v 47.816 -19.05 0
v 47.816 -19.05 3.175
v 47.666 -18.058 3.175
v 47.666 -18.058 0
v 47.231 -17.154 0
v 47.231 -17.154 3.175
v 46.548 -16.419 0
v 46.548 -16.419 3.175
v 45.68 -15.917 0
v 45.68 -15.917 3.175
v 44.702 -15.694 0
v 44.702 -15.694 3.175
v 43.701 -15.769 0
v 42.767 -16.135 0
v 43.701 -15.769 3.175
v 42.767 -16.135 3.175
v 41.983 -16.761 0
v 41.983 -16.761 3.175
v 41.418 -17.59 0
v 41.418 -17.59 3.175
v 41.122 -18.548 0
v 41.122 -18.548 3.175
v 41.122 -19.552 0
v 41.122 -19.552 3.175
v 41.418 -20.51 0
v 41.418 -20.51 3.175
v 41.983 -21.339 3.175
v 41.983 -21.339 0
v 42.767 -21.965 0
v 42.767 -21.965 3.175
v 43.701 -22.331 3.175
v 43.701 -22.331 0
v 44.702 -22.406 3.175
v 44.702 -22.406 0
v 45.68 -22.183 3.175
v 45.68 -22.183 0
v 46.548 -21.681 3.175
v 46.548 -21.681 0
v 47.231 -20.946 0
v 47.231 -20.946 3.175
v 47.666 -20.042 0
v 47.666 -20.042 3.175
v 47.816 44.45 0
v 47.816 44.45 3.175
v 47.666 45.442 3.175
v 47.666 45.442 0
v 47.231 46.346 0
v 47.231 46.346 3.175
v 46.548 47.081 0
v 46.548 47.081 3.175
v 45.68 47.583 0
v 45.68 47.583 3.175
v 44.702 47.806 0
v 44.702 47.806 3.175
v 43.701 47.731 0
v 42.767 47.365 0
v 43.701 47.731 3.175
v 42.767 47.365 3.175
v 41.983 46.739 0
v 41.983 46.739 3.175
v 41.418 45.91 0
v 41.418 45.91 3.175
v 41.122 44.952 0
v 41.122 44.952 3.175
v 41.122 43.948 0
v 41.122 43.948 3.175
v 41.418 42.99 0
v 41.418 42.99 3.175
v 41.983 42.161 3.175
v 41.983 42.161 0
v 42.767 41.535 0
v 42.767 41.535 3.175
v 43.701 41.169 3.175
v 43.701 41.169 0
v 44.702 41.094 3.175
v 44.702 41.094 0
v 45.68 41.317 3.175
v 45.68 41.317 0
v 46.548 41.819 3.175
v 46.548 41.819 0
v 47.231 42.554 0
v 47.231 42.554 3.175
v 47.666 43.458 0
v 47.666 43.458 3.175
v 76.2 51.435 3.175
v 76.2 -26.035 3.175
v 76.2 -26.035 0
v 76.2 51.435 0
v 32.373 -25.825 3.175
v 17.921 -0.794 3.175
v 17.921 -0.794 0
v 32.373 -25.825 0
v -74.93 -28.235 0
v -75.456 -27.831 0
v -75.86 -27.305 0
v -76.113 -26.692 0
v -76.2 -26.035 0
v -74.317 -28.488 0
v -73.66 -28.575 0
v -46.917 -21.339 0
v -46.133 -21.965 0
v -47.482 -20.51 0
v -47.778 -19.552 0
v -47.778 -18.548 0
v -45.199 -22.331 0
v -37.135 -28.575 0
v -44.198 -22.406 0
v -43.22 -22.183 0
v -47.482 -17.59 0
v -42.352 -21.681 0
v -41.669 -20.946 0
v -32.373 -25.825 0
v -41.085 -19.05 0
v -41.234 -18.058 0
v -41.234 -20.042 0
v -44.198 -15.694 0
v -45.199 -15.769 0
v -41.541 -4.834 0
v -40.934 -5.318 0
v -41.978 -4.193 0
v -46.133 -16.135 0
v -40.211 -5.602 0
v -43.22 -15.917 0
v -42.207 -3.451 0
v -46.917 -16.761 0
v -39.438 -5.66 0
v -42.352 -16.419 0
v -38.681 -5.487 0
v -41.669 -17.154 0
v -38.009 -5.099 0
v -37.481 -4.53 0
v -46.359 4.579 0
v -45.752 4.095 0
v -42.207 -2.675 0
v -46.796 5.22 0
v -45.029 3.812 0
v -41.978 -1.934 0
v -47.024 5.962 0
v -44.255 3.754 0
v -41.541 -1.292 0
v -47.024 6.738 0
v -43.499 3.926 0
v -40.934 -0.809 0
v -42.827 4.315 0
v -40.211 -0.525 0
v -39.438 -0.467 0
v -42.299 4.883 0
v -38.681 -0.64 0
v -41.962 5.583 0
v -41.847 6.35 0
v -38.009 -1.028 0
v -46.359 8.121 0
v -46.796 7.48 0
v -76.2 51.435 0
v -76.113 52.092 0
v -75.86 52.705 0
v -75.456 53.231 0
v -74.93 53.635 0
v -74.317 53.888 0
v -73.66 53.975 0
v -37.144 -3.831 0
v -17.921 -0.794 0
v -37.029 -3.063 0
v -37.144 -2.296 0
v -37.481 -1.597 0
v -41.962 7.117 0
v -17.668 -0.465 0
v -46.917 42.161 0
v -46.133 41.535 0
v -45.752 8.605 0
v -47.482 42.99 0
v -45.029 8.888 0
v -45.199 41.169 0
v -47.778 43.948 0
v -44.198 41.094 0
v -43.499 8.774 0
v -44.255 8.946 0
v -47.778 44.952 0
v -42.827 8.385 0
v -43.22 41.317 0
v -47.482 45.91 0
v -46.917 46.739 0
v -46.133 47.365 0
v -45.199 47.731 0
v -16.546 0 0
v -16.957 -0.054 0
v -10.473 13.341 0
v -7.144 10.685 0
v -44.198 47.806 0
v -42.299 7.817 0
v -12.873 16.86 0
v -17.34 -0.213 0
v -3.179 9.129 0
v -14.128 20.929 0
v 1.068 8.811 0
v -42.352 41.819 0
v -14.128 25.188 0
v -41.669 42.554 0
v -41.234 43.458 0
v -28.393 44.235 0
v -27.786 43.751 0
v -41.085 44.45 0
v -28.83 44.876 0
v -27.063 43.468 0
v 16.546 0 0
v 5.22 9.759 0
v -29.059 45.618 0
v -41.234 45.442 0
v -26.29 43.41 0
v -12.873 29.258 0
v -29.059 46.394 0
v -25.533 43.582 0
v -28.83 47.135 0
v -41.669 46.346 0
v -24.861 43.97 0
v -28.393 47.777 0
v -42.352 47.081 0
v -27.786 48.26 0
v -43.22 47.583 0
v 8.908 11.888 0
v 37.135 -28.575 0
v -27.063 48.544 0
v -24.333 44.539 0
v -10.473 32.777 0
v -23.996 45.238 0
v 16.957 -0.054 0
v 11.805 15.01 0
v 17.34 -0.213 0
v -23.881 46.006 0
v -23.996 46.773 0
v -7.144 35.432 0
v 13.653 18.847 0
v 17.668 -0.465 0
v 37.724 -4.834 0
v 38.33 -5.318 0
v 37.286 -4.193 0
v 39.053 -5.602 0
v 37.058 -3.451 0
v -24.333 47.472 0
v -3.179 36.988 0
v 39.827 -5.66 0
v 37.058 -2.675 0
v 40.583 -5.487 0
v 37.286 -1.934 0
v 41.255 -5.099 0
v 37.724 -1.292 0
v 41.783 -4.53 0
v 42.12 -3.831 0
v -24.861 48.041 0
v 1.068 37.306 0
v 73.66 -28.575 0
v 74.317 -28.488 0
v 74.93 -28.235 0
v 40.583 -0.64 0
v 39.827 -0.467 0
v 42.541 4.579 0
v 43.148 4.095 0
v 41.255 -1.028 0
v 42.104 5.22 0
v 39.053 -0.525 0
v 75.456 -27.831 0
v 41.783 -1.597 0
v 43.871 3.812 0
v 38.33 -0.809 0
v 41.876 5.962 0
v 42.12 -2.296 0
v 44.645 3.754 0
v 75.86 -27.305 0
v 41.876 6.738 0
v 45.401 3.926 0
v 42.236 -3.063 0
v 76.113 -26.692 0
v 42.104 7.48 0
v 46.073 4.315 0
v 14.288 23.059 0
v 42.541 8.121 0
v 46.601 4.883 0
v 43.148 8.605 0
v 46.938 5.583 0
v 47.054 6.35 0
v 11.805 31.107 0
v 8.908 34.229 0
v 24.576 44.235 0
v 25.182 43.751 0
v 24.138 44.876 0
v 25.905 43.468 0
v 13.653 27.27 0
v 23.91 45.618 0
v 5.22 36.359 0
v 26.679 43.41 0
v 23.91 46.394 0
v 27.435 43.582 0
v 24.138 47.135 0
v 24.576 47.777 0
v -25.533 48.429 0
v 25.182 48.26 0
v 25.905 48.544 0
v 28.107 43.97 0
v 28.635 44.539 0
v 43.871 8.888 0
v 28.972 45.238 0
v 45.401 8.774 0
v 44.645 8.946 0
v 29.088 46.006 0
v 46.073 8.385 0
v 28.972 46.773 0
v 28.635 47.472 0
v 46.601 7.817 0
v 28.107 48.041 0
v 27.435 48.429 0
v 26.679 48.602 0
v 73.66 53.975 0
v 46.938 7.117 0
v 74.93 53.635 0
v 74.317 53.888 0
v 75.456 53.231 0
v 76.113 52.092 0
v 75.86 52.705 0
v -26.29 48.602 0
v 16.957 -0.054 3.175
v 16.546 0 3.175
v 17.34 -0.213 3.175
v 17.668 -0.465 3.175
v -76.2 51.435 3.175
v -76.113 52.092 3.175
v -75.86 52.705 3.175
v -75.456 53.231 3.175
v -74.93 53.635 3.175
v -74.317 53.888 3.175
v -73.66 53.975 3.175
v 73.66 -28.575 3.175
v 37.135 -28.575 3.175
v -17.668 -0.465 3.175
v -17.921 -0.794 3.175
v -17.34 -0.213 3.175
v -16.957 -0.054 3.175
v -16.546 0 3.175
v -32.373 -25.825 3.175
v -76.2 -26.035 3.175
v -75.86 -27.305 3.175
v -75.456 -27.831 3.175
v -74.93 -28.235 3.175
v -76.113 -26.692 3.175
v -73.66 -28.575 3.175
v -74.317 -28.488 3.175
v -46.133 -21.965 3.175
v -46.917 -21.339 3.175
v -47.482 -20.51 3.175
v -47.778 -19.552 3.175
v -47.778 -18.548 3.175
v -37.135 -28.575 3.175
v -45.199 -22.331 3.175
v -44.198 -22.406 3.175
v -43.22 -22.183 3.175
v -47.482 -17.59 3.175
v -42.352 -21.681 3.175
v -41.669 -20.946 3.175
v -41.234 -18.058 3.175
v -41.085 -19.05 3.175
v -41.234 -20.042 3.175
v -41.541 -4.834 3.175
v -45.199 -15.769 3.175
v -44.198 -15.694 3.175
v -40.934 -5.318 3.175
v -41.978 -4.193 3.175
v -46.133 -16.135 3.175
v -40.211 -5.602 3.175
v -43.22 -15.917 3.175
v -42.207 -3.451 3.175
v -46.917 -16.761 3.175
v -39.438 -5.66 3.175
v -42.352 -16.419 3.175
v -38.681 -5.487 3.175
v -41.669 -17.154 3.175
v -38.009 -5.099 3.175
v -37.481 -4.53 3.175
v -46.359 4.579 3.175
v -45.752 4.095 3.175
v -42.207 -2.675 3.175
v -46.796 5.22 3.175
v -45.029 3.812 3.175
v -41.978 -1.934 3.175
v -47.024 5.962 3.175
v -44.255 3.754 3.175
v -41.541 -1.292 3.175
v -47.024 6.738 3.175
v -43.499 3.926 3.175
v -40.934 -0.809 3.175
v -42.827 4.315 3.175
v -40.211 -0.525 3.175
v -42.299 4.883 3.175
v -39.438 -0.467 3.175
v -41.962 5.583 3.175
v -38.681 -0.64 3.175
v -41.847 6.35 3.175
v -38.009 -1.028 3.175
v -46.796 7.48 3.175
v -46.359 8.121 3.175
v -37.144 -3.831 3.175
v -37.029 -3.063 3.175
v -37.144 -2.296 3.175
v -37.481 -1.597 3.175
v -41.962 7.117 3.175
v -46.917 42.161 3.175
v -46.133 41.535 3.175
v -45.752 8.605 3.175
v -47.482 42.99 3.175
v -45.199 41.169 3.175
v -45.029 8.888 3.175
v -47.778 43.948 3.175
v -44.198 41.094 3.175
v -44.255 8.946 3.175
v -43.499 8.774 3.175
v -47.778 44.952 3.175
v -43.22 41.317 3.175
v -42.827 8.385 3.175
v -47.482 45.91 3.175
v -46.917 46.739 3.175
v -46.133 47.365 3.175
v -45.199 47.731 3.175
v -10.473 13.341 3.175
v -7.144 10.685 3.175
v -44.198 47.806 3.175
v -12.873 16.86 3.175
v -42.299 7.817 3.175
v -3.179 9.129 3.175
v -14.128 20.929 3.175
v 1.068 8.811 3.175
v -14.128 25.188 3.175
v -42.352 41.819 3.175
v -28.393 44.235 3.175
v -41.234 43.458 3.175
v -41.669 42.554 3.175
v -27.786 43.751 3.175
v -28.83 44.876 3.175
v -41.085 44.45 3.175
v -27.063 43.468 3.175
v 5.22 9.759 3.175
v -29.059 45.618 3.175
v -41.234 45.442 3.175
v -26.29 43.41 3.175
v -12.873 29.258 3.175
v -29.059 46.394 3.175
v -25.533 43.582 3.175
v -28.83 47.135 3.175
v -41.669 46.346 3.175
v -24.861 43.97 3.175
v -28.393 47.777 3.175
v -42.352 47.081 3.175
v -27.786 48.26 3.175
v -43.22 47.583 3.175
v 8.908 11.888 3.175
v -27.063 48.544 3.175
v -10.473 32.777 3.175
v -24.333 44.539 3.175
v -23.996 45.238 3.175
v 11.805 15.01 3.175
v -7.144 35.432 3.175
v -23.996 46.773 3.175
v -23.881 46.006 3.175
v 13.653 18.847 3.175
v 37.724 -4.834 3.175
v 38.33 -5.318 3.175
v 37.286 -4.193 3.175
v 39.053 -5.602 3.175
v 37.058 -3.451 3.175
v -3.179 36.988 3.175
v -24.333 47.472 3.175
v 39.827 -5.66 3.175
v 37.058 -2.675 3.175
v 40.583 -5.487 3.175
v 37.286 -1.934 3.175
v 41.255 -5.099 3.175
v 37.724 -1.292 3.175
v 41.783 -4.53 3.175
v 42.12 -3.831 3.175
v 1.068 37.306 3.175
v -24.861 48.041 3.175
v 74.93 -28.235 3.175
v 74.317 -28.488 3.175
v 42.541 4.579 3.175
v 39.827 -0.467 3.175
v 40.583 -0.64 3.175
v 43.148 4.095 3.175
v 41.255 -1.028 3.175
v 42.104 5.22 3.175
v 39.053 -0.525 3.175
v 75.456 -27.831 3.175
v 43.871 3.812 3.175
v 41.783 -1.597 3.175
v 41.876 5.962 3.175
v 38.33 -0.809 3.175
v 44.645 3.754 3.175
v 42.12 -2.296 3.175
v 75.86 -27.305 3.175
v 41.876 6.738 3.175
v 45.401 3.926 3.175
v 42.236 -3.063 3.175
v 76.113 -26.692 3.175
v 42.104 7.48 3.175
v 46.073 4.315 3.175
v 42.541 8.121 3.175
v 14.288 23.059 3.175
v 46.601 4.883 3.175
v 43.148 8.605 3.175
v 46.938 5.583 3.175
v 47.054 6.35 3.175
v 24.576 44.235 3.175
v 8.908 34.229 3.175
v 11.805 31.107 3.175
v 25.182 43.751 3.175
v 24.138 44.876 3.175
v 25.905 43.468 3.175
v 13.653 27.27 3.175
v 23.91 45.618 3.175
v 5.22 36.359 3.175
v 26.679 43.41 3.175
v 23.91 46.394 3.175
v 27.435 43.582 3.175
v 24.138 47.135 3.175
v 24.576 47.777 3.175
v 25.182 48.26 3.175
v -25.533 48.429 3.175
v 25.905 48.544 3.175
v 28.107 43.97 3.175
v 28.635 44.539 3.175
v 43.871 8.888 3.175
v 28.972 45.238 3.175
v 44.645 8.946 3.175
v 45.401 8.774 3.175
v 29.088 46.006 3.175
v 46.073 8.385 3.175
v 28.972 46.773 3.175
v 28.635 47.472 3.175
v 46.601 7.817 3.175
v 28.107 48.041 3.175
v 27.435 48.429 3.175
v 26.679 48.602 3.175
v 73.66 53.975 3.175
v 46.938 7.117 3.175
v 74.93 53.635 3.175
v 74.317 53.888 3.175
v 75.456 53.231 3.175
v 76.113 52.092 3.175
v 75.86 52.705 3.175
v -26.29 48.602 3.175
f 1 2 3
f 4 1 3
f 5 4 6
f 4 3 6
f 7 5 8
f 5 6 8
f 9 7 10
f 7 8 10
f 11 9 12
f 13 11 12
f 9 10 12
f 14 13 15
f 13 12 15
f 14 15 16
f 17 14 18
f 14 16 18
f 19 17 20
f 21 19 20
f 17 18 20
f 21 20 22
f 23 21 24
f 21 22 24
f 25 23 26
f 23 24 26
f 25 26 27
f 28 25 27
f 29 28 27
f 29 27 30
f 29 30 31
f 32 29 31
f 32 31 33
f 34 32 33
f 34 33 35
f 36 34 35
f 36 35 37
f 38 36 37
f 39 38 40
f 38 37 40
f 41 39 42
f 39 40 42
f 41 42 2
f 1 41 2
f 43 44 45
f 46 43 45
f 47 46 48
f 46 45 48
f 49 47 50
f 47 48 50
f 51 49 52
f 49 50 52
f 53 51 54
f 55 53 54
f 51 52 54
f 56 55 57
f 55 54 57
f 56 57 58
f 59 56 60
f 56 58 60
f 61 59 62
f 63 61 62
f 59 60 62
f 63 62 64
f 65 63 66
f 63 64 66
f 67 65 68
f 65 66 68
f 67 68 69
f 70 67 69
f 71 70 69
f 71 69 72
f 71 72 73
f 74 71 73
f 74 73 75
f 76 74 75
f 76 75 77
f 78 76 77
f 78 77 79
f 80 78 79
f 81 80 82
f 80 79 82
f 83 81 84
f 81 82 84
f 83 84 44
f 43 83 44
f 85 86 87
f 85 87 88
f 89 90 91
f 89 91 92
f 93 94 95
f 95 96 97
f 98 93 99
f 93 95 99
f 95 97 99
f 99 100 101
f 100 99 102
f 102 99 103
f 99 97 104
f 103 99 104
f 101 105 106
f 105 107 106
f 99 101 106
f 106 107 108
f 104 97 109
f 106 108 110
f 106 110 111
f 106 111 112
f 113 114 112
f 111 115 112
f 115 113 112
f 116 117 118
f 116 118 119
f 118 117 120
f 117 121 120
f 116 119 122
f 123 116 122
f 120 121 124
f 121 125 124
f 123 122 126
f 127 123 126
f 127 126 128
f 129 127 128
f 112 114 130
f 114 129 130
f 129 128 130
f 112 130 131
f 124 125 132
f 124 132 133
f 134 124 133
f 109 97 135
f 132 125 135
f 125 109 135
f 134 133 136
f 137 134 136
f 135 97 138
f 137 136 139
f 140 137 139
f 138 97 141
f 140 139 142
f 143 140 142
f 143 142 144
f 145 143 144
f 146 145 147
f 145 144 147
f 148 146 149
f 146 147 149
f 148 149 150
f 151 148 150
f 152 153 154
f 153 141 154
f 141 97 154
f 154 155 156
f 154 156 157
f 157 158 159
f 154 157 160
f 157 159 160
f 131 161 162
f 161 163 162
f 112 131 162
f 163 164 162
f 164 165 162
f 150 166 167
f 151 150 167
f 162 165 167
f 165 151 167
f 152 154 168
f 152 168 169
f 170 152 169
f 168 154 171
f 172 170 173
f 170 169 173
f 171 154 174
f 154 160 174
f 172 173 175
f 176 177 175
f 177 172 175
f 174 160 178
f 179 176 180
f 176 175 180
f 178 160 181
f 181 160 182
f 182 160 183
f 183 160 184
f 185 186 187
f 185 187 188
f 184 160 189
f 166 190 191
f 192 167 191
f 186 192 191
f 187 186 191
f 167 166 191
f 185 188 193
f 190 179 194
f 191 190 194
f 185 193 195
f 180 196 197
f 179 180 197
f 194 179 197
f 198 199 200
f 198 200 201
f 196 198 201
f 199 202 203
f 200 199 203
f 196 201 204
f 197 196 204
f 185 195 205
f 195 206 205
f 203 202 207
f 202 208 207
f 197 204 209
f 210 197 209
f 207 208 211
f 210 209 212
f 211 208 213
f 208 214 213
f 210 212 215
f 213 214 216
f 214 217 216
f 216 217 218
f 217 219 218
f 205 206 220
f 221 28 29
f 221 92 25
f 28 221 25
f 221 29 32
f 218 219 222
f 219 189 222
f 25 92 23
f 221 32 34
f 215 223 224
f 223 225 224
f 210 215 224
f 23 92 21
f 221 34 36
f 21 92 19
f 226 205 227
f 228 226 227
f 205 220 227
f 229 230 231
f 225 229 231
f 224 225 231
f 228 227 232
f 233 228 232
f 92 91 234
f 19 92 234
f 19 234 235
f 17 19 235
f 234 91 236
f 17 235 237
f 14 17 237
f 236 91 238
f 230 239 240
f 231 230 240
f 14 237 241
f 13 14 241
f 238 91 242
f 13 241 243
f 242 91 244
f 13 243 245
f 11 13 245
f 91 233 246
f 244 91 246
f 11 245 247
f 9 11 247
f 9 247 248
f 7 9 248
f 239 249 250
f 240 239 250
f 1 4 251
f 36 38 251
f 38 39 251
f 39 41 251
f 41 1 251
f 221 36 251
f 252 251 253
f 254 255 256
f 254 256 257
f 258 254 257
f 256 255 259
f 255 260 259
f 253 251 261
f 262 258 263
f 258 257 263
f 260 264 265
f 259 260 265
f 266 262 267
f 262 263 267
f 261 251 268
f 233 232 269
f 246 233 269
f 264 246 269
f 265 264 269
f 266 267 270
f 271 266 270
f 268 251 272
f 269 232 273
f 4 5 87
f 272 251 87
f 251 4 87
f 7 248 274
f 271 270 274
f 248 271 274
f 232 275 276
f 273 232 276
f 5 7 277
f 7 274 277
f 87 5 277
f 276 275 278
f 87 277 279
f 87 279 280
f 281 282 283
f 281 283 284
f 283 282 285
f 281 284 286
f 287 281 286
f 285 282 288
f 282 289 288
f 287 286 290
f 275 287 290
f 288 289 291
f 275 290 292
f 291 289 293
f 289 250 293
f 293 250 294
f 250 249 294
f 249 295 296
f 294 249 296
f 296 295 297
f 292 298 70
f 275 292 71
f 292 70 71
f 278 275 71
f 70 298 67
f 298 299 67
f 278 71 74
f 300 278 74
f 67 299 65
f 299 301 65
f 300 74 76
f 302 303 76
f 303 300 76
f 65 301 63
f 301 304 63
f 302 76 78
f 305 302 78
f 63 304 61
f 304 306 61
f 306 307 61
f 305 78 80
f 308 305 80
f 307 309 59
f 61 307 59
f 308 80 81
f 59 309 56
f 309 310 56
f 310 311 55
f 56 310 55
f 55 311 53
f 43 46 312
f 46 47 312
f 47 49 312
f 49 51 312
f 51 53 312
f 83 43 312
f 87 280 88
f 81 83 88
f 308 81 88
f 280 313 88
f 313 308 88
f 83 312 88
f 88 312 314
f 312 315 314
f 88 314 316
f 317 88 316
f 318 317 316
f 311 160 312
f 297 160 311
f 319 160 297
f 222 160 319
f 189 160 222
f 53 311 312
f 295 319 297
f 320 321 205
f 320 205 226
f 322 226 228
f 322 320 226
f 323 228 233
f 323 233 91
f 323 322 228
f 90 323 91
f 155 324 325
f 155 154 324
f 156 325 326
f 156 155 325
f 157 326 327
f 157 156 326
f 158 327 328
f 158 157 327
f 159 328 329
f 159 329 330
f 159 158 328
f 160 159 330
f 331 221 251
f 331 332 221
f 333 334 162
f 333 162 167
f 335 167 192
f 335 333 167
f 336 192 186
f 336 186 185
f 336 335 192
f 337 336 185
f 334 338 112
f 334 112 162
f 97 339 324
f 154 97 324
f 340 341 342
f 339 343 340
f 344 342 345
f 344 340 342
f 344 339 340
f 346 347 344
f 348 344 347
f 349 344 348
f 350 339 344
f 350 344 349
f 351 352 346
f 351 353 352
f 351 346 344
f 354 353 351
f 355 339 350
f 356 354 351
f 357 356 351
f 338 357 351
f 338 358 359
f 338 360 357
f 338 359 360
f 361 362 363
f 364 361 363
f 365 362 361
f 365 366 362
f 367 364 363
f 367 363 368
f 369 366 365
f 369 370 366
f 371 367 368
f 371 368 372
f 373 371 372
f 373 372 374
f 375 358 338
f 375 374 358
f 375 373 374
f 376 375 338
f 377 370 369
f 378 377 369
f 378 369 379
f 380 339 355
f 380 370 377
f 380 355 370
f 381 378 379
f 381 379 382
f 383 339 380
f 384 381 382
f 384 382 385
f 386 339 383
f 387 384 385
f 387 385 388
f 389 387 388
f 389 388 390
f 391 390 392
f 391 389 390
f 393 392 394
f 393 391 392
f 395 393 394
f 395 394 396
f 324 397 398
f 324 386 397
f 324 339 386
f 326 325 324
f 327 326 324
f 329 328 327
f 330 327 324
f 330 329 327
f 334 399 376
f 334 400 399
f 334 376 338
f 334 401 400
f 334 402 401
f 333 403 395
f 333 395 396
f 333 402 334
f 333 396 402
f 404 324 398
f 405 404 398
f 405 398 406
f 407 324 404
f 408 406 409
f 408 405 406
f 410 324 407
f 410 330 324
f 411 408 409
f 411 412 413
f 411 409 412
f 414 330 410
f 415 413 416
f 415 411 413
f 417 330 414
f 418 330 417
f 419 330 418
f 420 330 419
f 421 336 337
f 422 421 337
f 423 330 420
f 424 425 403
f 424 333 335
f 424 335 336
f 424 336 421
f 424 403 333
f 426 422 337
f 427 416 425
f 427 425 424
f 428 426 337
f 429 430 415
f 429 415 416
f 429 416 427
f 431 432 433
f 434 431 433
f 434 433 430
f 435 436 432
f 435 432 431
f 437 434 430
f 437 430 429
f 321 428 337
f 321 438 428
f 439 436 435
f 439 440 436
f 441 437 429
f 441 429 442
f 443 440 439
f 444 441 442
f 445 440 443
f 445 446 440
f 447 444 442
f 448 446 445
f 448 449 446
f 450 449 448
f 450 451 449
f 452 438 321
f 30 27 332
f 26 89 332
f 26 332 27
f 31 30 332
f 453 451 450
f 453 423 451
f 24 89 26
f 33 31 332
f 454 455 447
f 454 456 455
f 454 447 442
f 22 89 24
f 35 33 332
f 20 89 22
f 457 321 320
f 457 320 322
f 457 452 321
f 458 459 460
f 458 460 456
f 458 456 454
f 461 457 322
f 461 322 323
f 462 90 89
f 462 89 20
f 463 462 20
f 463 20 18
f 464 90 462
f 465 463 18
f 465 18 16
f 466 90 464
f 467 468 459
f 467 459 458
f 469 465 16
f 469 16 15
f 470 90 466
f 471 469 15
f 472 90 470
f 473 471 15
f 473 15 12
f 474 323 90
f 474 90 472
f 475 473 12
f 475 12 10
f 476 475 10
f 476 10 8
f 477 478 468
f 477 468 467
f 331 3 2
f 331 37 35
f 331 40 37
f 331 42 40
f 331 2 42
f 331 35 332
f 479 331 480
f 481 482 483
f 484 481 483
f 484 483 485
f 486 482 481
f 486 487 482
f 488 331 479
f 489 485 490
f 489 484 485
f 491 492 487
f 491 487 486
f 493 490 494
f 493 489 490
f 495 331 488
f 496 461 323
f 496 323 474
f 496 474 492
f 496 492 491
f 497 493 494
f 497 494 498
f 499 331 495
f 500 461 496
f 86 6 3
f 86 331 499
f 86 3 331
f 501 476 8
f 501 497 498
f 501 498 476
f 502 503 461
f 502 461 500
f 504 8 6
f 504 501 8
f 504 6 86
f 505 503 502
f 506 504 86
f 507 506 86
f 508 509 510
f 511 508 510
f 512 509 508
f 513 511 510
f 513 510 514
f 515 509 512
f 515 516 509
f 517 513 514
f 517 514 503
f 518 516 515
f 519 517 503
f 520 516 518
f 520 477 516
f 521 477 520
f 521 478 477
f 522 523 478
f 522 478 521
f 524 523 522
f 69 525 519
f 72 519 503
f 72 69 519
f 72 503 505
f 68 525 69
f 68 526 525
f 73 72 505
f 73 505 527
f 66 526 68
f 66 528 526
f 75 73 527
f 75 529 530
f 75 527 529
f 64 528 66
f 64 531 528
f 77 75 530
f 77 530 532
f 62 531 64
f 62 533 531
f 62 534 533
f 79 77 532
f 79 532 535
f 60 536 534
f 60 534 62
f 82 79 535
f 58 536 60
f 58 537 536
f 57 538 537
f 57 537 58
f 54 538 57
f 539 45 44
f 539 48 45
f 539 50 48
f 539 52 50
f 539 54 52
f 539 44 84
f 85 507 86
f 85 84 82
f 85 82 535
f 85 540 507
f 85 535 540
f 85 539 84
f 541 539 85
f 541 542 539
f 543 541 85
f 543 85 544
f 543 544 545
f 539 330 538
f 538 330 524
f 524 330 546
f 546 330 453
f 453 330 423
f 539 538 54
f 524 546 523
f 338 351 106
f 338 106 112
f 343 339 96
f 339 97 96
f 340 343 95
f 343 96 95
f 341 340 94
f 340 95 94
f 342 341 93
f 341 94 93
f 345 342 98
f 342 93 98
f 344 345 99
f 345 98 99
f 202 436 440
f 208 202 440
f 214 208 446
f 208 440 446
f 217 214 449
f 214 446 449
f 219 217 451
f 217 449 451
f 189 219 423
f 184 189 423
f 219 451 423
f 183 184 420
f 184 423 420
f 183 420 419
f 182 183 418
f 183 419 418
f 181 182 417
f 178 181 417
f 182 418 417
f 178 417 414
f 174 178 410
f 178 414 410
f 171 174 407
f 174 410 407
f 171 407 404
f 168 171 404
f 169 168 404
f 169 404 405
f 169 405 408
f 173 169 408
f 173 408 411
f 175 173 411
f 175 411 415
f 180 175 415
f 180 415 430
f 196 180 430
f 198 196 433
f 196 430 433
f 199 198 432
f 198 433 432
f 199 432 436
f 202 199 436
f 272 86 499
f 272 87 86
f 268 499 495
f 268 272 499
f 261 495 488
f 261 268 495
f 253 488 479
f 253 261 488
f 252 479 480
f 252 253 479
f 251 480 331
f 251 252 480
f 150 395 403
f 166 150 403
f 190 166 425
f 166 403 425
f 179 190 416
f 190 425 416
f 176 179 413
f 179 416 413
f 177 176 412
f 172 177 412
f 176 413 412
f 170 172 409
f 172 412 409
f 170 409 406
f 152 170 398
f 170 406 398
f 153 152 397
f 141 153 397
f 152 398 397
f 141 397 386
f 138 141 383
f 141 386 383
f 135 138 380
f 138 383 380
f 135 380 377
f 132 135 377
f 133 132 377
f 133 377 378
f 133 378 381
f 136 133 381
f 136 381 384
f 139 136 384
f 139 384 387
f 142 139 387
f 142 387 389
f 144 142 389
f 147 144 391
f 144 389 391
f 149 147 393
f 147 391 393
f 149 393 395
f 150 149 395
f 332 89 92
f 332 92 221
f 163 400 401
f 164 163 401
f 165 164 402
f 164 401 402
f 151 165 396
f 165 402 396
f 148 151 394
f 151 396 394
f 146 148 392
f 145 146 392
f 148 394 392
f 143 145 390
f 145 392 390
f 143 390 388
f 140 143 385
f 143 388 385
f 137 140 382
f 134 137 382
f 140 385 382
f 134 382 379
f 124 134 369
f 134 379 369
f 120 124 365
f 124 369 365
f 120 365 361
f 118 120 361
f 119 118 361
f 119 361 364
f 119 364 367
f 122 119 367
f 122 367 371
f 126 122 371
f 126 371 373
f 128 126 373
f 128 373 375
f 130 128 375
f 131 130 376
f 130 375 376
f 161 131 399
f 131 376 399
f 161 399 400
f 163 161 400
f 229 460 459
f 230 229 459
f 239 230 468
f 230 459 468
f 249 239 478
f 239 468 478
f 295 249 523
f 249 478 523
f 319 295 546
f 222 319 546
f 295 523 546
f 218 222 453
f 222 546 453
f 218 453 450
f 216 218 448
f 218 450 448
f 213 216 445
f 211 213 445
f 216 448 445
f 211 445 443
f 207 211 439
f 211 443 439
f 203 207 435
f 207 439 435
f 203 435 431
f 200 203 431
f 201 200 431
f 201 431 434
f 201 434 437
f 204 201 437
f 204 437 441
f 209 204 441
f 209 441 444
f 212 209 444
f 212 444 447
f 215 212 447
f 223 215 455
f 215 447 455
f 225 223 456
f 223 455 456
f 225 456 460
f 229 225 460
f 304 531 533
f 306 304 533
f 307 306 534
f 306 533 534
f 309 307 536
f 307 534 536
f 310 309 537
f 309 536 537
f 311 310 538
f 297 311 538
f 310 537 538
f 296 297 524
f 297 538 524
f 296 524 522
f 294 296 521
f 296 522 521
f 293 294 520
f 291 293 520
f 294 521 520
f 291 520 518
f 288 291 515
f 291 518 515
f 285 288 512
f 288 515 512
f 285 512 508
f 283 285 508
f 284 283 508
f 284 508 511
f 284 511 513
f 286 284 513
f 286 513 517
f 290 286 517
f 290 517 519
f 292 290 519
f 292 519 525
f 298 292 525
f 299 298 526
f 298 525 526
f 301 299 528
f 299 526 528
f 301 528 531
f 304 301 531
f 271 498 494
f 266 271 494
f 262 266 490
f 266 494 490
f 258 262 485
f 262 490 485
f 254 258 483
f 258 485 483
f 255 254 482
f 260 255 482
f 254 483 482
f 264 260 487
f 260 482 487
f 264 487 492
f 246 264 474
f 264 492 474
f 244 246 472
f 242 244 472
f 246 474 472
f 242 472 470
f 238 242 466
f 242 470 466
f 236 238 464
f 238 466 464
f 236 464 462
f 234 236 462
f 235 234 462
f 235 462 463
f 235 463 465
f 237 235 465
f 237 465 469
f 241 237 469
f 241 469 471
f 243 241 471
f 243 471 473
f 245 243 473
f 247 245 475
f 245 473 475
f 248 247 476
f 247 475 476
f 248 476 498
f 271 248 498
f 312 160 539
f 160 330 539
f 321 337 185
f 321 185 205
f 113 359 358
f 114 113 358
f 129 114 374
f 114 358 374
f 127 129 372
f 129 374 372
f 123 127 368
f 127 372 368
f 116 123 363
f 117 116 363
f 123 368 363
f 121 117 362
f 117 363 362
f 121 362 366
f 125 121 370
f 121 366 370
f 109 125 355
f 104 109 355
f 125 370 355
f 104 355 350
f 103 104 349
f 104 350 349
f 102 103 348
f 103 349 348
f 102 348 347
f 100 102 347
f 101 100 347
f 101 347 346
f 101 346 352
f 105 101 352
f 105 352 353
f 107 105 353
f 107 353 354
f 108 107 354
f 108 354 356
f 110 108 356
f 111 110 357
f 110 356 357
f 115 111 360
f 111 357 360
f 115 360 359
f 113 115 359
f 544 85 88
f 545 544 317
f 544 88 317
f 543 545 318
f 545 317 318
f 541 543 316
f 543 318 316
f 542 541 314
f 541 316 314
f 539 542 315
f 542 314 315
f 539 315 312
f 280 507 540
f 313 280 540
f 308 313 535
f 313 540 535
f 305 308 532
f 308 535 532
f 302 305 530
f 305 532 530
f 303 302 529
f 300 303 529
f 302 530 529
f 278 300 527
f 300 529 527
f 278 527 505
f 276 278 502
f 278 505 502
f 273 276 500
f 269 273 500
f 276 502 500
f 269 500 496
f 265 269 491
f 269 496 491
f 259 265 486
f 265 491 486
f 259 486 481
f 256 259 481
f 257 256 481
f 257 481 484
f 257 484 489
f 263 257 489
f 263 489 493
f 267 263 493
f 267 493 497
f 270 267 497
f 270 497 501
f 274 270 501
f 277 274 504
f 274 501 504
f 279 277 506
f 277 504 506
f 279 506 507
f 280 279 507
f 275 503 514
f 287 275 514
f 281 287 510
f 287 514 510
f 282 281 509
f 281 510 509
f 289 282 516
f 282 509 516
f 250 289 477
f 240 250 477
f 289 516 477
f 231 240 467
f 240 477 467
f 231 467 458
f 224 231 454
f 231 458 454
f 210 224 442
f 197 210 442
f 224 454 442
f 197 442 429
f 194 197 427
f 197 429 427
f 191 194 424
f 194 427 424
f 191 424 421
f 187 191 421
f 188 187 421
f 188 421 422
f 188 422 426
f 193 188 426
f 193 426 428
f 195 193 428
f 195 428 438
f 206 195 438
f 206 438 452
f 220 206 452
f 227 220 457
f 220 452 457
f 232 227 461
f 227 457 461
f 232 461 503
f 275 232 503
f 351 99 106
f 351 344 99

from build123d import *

# Parameters (mm, degrees)
SKETCH1_R           = 2.6035
SKETCH1_R_2         = 3.3655
SKETCH1_R_3         = 14.2875
BOSS_EXTRUDE1_DEPTH = 3.175
SKETCH2_W           = 25.4
SKETCH2_H           = 82.55
BOSS_EXTRUDE2_DEPTH = 3.175
FILLET1_R           = 2.54


with BuildPart() as part:
    # Sketch1 → Boss-Extrude1 (new body)
    with BuildSketch(Plane.XY.offset(3.175)):
        with BuildLine():
            Line((53.975, -25.4), (53.975, 50.8))
            Line((53.975, 50.8), (50.8, 53.975))
            Line((50.8, 53.975), (-50.8, 53.975))
            Line((-50.8, 53.975), (-53.975, 50.8))
            Line((-53.975, 50.8), (-53.975, -25.4))
            Line((-53.975, -25.4), (-50.8, -28.575))
            Line((-50.8, -28.575), (-37.135283942, -28.575))
            Line((-37.135283942, -28.575), (-32.372783942, -25.825369343))
            Line((-32.372783942, -25.825369343), (-17.920771776, -0.79375))
            ThreePointArc((-17.920771776, -0.79375), (-17.339706448, -0.212684671), (-16.545956448, 0))
            Line((-16.545956448, 0), (16.545956448, 0))
            ThreePointArc((16.545956448, 0), (17.339706448, -0.212684671), (17.920771776, -0.79375))
            Line((17.920771776, -0.79375), (32.372783942, -25.825369343))
            Line((32.372783942, -25.825369343), (37.135283942, -28.575))
            Line((37.135283942, -28.575), (50.8, -28.575))
            Line((50.8, -28.575), (53.975, -25.4))
        make_face()
        with Locations((44.45, 6.35)):
            Circle(SKETCH1_R, mode=Mode.SUBTRACT)
        with Locations((26.484101205, 46.005749811)):
            Circle(SKETCH1_R, mode=Mode.SUBTRACT)
        with Locations((-39.632108696, -3.063282164)):
            Circle(SKETCH1_R, mode=Mode.SUBTRACT)
        with Locations((44.45, -19.05)):
            Circle(SKETCH1_R_2, mode=Mode.SUBTRACT)
        with Locations((44.45, 44.45)):
            Circle(SKETCH1_R_2, mode=Mode.SUBTRACT)
        with Locations((0, 23.058733918)):
            Circle(SKETCH1_R_3, mode=Mode.SUBTRACT)
        with Locations((-44.45, 44.45)):
            Circle(SKETCH1_R_2, mode=Mode.SUBTRACT)
        with Locations((-44.45, -19.05)):
            Circle(SKETCH1_R_2, mode=Mode.SUBTRACT)
        with Locations((-44.45, 6.35)):
            Circle(SKETCH1_R, mode=Mode.SUBTRACT)
        with Locations((-26.484101205, 46.005749811)):
            Circle(SKETCH1_R, mode=Mode.SUBTRACT)
        with Locations((39.632108696, -3.063282164)):
            Circle(SKETCH1_R, mode=Mode.SUBTRACT)
    extrude(amount=-BOSS_EXTRUDE1_DEPTH)

    # Sketch2 → Boss-Extrude2 (add, through all)
    with BuildSketch(Plane.XY.offset(3.175)):
        with Locations((-63.5, 12.7)):
            Rectangle(SKETCH2_W, SKETCH2_H)
        with Locations((63.5, 12.7)):
            Rectangle(SKETCH2_W, SKETCH2_H)
    extrude(amount=-BOSS_EXTRUDE2_DEPTH)

    # Fillet1
    fillet1_edges = [part.edges().sort_by_distance(p)[0] for p in [
        (76.2, -28.575, 1.5875),
        (76.2, 53.975, 1.5875),
        (-76.2, -28.575, 1.5875),
        (-76.2, 53.975, 1.5875),
    ]]
    fillet(fillet1_edges, radius=FILLET1_R)


solid = part.part
